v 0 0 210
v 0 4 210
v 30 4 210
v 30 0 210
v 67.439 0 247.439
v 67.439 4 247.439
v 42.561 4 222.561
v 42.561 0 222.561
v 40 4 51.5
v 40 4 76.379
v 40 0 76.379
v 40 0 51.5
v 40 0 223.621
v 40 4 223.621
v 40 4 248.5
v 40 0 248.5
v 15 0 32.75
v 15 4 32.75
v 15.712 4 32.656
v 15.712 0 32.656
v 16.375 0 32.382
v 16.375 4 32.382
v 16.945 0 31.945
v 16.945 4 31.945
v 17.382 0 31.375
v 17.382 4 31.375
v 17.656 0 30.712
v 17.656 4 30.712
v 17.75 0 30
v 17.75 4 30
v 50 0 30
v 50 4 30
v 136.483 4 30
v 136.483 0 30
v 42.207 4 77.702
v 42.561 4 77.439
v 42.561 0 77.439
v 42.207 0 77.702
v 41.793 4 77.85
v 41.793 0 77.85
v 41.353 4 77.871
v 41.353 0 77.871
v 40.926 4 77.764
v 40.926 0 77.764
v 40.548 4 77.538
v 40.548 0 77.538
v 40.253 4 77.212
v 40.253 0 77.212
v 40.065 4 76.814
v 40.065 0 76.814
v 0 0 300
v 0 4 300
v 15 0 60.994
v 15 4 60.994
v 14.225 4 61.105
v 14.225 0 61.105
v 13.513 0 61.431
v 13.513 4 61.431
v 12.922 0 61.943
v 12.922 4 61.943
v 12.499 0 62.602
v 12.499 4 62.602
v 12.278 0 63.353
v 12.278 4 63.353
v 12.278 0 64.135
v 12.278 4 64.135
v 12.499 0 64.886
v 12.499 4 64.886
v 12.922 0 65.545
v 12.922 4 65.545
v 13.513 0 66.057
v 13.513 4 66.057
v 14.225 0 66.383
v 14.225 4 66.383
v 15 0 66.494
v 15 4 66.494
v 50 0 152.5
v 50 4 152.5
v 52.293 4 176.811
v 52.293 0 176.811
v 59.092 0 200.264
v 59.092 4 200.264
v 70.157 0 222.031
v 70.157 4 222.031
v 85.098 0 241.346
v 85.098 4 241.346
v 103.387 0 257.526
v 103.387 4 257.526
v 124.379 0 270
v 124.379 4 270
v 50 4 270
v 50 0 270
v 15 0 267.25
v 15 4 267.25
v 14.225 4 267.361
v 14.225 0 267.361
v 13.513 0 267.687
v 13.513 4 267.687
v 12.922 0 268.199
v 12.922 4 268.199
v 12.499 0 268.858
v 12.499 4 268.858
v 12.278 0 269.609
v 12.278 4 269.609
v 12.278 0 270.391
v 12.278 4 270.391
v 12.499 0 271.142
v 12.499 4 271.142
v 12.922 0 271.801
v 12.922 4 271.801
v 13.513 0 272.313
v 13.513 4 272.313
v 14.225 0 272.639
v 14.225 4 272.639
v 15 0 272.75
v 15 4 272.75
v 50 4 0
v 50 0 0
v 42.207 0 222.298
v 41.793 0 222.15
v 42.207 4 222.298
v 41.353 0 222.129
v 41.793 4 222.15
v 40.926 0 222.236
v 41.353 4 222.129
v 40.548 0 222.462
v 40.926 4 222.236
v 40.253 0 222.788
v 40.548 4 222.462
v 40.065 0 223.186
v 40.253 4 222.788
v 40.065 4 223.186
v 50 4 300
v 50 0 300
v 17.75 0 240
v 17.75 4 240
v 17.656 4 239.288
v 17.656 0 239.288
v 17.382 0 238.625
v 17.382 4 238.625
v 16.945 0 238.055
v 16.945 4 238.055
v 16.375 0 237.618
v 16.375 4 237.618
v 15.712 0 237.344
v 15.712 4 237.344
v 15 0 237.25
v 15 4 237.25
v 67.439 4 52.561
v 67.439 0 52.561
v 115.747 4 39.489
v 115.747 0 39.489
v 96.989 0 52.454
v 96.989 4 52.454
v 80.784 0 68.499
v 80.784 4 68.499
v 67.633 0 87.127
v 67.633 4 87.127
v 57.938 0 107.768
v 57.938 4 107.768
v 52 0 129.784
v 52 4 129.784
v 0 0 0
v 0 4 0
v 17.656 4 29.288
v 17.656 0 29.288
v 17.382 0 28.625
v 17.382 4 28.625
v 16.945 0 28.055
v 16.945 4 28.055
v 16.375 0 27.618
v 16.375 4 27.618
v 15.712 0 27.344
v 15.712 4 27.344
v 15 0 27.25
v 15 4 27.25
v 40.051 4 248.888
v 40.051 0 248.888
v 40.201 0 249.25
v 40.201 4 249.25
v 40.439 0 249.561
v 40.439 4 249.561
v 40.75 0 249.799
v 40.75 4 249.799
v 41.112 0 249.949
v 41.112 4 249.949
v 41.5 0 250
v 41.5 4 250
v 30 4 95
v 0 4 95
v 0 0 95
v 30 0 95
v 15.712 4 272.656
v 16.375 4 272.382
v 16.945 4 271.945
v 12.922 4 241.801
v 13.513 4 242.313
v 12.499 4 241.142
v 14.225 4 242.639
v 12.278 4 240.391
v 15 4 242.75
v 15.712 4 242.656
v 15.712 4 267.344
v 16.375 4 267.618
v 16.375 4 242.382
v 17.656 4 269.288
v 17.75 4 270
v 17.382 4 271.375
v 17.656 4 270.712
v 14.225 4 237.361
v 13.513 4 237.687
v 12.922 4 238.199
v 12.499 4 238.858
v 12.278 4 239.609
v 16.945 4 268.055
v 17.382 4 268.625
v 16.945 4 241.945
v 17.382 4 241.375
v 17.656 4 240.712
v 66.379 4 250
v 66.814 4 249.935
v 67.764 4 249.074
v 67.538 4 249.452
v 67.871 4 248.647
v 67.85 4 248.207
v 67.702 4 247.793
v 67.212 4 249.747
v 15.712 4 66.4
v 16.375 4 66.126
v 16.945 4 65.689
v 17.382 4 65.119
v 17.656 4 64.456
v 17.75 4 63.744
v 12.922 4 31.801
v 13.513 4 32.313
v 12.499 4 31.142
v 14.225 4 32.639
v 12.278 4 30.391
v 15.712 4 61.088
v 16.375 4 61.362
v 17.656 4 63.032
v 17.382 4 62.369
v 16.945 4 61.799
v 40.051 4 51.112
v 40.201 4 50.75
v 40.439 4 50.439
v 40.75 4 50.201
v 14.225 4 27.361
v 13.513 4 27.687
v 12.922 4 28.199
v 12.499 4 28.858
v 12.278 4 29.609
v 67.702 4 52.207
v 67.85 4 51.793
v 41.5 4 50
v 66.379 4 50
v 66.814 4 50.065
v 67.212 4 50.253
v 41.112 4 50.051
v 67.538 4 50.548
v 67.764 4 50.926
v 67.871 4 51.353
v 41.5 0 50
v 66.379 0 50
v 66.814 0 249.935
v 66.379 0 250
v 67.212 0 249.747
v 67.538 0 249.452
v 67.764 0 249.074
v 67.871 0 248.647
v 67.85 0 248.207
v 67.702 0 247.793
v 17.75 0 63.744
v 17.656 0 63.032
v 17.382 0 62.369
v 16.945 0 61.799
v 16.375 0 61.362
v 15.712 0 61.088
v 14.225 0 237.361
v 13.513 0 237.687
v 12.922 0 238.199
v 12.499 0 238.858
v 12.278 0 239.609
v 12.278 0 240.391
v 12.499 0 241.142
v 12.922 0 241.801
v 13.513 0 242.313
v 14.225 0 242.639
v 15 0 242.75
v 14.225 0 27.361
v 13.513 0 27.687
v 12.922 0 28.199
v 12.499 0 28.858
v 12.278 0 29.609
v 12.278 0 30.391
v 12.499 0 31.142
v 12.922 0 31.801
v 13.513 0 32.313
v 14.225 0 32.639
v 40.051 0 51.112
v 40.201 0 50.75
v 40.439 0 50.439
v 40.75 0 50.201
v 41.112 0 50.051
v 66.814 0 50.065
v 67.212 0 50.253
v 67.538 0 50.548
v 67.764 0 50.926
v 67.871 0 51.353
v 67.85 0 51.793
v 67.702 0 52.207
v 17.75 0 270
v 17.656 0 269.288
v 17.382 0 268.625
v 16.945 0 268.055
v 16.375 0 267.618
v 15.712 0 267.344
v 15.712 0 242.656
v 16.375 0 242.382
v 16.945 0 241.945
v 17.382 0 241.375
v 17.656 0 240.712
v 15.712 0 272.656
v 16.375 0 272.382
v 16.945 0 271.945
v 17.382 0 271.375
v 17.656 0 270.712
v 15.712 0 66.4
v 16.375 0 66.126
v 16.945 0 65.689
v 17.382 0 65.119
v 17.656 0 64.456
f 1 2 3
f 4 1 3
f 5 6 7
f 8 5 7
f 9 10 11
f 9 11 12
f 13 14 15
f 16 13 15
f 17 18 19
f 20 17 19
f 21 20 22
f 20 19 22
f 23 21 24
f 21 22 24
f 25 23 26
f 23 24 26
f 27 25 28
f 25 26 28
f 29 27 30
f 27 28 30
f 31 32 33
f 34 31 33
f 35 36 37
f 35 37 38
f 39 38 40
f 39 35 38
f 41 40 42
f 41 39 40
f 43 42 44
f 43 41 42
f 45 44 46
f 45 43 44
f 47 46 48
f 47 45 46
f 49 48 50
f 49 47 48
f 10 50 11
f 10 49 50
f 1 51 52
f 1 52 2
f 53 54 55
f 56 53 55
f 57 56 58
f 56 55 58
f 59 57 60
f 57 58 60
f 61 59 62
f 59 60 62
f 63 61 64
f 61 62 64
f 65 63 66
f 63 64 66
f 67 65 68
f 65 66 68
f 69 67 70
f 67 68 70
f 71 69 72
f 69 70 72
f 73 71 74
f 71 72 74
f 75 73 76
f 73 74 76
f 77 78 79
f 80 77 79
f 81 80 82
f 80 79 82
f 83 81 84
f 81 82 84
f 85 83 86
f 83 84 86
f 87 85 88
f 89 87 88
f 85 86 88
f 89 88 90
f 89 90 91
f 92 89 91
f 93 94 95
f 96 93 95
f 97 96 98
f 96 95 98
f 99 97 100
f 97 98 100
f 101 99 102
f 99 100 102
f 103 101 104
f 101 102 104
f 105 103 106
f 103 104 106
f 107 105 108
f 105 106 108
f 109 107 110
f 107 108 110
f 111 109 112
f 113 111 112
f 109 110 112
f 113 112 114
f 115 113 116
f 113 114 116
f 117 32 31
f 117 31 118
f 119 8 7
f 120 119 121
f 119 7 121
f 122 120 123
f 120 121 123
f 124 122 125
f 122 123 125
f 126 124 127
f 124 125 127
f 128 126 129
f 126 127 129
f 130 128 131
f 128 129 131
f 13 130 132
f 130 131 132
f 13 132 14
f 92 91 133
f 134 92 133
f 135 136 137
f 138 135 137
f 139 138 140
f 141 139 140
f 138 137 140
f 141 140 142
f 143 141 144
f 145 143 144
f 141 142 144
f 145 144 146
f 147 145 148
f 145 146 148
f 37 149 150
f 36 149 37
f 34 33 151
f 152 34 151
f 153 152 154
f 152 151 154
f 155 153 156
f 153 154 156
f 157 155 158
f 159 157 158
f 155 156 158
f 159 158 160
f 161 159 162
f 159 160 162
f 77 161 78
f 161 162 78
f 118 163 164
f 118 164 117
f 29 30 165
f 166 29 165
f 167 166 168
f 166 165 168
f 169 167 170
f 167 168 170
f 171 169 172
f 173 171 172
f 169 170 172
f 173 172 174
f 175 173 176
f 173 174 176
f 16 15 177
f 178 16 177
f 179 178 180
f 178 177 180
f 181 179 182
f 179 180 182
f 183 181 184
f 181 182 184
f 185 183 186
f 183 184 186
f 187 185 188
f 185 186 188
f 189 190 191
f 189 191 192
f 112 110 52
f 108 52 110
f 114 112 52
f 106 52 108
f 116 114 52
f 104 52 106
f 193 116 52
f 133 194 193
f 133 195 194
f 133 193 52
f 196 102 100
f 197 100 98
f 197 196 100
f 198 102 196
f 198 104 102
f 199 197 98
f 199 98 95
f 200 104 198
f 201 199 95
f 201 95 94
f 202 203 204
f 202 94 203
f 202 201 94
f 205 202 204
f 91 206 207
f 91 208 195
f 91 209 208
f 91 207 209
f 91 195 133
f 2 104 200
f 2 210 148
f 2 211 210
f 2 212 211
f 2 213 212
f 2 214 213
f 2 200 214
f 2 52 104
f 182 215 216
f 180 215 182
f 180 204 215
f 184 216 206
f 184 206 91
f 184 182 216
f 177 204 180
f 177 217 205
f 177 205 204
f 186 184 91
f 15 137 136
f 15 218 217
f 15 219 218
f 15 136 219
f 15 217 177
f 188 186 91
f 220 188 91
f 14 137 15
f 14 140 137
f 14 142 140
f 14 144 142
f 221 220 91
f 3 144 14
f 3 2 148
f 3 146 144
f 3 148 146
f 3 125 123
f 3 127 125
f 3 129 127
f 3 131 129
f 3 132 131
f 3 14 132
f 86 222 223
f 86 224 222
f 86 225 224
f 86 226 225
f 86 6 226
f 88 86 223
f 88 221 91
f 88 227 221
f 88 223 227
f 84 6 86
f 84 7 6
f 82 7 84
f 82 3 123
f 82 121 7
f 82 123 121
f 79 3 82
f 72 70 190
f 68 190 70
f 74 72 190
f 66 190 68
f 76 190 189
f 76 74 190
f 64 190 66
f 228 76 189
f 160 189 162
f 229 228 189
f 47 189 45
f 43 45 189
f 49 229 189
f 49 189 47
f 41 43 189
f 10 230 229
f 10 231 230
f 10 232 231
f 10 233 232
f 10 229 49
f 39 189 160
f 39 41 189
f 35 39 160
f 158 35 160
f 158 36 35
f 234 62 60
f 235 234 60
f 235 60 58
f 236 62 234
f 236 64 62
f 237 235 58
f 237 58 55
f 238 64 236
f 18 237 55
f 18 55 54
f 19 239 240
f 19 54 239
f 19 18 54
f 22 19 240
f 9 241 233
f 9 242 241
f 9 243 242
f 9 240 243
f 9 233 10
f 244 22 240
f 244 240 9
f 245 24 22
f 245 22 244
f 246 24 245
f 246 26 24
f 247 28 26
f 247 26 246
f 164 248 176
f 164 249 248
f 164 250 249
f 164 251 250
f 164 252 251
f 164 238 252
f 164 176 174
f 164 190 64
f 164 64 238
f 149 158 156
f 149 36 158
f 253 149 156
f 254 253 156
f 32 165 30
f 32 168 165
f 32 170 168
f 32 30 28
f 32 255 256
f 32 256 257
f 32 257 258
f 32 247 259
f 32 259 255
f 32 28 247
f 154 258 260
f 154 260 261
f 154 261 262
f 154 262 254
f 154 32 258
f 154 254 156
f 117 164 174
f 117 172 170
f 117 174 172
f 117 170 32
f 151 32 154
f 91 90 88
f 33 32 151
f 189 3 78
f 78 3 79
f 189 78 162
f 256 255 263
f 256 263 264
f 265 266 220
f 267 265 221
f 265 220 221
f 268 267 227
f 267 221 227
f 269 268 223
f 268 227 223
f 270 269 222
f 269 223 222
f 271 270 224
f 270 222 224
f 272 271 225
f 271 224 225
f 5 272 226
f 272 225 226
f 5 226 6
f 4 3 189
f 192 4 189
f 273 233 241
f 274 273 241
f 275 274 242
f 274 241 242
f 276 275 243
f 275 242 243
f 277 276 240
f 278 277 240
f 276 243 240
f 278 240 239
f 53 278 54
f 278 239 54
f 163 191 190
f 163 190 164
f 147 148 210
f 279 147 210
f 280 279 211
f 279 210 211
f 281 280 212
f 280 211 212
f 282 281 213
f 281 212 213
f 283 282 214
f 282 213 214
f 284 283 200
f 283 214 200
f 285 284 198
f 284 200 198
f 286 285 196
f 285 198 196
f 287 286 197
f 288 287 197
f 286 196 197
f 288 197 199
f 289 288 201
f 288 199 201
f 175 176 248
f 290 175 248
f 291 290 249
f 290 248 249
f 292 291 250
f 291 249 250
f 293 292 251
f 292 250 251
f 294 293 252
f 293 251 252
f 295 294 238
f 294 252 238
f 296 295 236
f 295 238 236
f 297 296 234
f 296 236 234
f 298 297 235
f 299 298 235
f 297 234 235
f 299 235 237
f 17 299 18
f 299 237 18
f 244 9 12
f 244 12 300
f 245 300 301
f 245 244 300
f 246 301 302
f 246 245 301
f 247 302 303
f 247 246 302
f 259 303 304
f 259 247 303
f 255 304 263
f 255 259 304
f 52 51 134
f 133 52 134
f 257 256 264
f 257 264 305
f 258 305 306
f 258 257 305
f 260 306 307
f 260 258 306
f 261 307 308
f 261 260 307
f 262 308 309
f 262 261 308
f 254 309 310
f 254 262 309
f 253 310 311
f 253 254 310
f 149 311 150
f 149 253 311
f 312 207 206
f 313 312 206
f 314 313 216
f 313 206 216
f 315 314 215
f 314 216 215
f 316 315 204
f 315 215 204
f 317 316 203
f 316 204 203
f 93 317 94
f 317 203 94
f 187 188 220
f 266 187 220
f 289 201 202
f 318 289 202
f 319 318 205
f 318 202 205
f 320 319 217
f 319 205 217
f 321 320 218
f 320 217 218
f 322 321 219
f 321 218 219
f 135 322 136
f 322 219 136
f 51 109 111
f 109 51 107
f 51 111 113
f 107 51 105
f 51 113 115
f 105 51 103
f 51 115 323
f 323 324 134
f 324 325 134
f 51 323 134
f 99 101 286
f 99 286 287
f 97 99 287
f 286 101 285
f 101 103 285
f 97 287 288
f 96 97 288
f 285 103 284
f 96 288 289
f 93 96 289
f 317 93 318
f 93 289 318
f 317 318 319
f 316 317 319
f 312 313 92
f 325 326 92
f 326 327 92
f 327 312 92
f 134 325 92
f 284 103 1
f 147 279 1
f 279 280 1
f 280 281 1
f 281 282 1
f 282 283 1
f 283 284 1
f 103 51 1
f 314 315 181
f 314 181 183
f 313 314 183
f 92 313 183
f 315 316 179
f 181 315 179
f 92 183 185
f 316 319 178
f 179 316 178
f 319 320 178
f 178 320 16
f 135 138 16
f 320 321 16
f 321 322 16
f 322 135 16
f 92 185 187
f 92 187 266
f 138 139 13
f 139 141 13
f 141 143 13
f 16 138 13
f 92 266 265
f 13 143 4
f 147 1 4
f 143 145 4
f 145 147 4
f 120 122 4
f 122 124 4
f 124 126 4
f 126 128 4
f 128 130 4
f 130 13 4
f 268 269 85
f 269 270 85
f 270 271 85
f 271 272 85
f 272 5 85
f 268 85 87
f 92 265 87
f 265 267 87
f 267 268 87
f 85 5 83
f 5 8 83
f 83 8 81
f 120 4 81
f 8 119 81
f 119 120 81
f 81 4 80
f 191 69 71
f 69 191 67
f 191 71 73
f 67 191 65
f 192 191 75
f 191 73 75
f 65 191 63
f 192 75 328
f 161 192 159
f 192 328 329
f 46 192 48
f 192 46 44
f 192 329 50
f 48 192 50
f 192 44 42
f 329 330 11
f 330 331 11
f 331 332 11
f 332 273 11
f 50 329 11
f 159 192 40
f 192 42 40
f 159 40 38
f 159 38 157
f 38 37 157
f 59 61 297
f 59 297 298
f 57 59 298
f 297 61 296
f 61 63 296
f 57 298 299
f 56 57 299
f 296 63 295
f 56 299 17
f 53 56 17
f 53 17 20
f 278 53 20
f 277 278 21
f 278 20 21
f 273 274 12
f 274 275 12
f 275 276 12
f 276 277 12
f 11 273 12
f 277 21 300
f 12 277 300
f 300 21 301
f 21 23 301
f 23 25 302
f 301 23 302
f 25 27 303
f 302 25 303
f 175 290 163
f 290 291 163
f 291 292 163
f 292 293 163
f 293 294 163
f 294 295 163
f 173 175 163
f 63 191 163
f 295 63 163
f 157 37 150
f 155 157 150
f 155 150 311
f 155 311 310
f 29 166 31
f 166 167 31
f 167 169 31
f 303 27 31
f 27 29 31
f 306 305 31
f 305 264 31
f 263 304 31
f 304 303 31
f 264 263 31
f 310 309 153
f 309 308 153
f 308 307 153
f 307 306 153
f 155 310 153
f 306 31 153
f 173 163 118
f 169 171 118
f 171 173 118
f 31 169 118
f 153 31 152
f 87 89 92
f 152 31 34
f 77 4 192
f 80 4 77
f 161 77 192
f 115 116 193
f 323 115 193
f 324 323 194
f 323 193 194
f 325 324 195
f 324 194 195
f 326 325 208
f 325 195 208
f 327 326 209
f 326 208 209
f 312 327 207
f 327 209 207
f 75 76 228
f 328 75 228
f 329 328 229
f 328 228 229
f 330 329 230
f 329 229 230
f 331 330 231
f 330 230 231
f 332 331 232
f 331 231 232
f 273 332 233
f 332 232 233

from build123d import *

# Parameters (mm, degrees)
SKETCH_1_W          = 360
SKETCH_1_H          = 300
EXTRUDE_1_DEPTH     = 4
SKETCH_2_W          = 260
SKETCH_2_H          = 30
CUT_EXTRUDE_1_DEPTH = 469.632051827
SKETCH_3_W          = 30
SKETCH_3_H          = 115
CUT_EXTRUDE_2_DEPTH = 469.632051827
CUT_EXTRUDE_3_DEPTH = 469.632051827
CUT_EXTRUDE_4_DEPTH = 330.611201771
CUT_EXTRUDE_5_DEPTH = 330.611201771


with BuildPart() as part:
    # 草图1 → 凸台-拉伸1 (new body)
    with BuildSketch(Plane(origin=(0, 0, 0), x_dir=(1, 0, 0), z_dir=(0, 1, 0))):
        with Locations((180, -150)):
            Rectangle(SKETCH_1_W, SKETCH_1_H)
    extrude(amount=EXTRUDE_1_DEPTH)

    # 草图2 → 切除-拉伸1 (cut, through all)
    with BuildSketch(Plane(origin=(0, 4, 0), x_dir=(1, 0, 0), z_dir=(0, 1, 0))):
        with Locations((180, -15)):
            Rectangle(SKETCH_2_W, SKETCH_2_H)
        Polygon((310, -270), (50, -270), (50, -300), (310, -300), (310, -297.414750004), align=None)
    extrude(amount=-CUT_EXTRUDE_1_DEPTH, mode=Mode.SUBTRACT)

    # 草图3 → 切除-拉伸2 (cut, through all)
    with BuildSketch(Plane(origin=(0, 4, 0), x_dir=(1, 0, 0), z_dir=(0, 1, 0))):
        with Locations((15, -152.5)):
            Rectangle(SKETCH_3_W, SKETCH_3_H)
        with Locations((345, -152.5)):
            Rectangle(SKETCH_3_W, SKETCH_3_H)
    extrude(amount=-CUT_EXTRUDE_2_DEPTH, mode=Mode.SUBTRACT)

    # 草图4 → 切除-拉伸3 (cut, through all)
    with BuildSketch(Plane(origin=(0, 4, 0), x_dir=(1, 0, 0), z_dir=(0, 1, 0))):
        with BuildLine():
            ThreePointArc((136.482762036, -30), (73.799150344, -77.524140336), (50, -152.5))
            Line((50, -152.5), (180, -152.5))
            Line((180, -152.5), (180, -30))
            Line((180, -30), (136.482762036, -30))
        make_face()
        with BuildLine():
            Line((180, -30), (180, -152.5))
            Line((180, -152.5), (310, -152.5))
            ThreePointArc((310, -152.5), (286.200849656, -77.524140336), (223.517237964, -30))
            Line((223.517237964, -30), (180, -30))
        make_face()
        with BuildLine():
            Line((180, -152.5), (50, -152.5))
            ThreePointArc((50, -152.5), (70.157400056, -222.031311203), (124.378511347, -270))
            Line((124.378511347, -270), (180, -270))
            Line((180, -270), (180, -152.5))
        make_face()
        with BuildLine():
            Line((310, -152.5), (180, -152.5))
            Line((180, -152.5), (180, -270))
            Line((180, -270), (235.621488653, -270))
            ThreePointArc((235.621488653, -270), (289.842599944, -222.031311203), (310, -152.5))
        make_face()
    extrude(amount=-CUT_EXTRUDE_3_DEPTH, mode=Mode.SUBTRACT)


with BuildPart() as cut_extrude_3_kept_piece:
    # of the separate pieces the step leaves, the one the design keeps (cut_extrude_3_pieces_kept)
    add(part.part.solids().sort_by_distance((0, 0, 0))[0])

    # 草图5 → 切除-拉伸4 (cut, through all)
    with BuildSketch(Plane(origin=(0, 4, 0), x_dir=(1, 0, 0), z_dir=(0, 1, 0))):
        with BuildLine():
            ThreePointArc((15, -27.25), (12.25, -30), (15, -32.75))
            Line((15, -32.75), (15, -30))
            Line((15, -30), (15, -27.25))
        make_face()
        with BuildLine():
            Line((15, -30), (15, -32.75))
            ThreePointArc((15, -32.75), (16.944543648, -31.944543648), (17.75, -30))
            ThreePointArc((17.75, -30), (16.944543648, -28.055456352), (15, -27.25))
            Line((15, -27.25), (15, -30))
        make_face()
        with BuildLine():
            ThreePointArc((15, -60.994001195), (12.25, -63.744001195), (15, -66.494001195))
            Line((15, -66.494001195), (15, -63.744001195))
            Line((15, -63.744001195), (15, -60.994001195))
        make_face()
        with BuildLine():
            Line((15, -63.744001195), (15, -66.494001195))
            ThreePointArc((15, -66.494001195), (16.944543648, -65.688544844), (17.75, -63.744001195))
            ThreePointArc((17.75, -63.744001195), (16.944543648, -61.799457547), (15, -60.994001195))
            Line((15, -60.994001195), (15, -63.744001195))
        make_face()
        with BuildLine():
            ThreePointArc((15, -237.25), (12.25, -240), (15, -242.75))
            Line((15, -242.75), (15, -240))
            Line((15, -240), (15, -237.25))
        make_face()
        with BuildLine():
            Line((15, -240), (15, -242.75))
            ThreePointArc((15, -242.75), (16.944543648, -241.944543648), (17.75, -240))
            ThreePointArc((17.75, -240), (16.944543648, -238.055456352), (15, -237.25))
            Line((15, -237.25), (15, -240))
        make_face()
        with BuildLine():
            ThreePointArc((15, -267.25), (12.25, -270), (15, -272.75))
            Line((15, -272.75), (15, -270))
            Line((15, -270), (15, -267.25))
        make_face()
        with BuildLine():
            Line((15, -270), (15, -272.75))
            ThreePointArc((15, -272.75), (16.944543648, -271.944543648), (17.75, -270))
            ThreePointArc((17.75, -270), (16.944543648, -268.055456352), (15, -267.25))
            Line((15, -267.25), (15, -270))
        make_face()
    extrude(amount=-CUT_EXTRUDE_4_DEPTH, mode=Mode.SUBTRACT)

    # 草图6 → 切除-拉伸5 (cut, through all)
    with BuildSketch(Plane(origin=(0, 4, 0), x_dir=(1, 0, 0), z_dir=(0, 1, 0))):
        with BuildLine():
            Line((50, -50), (66.378679656, -50))
            ThreePointArc((66.378679656, -50), (67.764498955, -50.925974851), (67.439339828, -52.560660172))
            Line((67.439339828, -52.560660172), (42.560660172, -77.439339828))
            ThreePointArc((42.560660172, -77.439339828), (40.925974851, -77.764498955), (40, -76.378679656))
            Line((40, -76.378679656), (40, -51.5))
            ThreePointArc((40, -51.5), (40.439339828, -50.439339828), (41.5, -50))
            Line((41.5, -50), (50, -50))
        make_face()
    cut_extrude_5 = extrude(amount=-CUT_EXTRUDE_5_DEPTH, mode=Mode.SUBTRACT)

    # 镜向1: 切除-拉伸5 across plane
    add(cut_extrude_5.mirror(Plane.XY.offset(150)), mode=Mode.SUBTRACT)


solid = cut_extrude_3_kept_piece.part
